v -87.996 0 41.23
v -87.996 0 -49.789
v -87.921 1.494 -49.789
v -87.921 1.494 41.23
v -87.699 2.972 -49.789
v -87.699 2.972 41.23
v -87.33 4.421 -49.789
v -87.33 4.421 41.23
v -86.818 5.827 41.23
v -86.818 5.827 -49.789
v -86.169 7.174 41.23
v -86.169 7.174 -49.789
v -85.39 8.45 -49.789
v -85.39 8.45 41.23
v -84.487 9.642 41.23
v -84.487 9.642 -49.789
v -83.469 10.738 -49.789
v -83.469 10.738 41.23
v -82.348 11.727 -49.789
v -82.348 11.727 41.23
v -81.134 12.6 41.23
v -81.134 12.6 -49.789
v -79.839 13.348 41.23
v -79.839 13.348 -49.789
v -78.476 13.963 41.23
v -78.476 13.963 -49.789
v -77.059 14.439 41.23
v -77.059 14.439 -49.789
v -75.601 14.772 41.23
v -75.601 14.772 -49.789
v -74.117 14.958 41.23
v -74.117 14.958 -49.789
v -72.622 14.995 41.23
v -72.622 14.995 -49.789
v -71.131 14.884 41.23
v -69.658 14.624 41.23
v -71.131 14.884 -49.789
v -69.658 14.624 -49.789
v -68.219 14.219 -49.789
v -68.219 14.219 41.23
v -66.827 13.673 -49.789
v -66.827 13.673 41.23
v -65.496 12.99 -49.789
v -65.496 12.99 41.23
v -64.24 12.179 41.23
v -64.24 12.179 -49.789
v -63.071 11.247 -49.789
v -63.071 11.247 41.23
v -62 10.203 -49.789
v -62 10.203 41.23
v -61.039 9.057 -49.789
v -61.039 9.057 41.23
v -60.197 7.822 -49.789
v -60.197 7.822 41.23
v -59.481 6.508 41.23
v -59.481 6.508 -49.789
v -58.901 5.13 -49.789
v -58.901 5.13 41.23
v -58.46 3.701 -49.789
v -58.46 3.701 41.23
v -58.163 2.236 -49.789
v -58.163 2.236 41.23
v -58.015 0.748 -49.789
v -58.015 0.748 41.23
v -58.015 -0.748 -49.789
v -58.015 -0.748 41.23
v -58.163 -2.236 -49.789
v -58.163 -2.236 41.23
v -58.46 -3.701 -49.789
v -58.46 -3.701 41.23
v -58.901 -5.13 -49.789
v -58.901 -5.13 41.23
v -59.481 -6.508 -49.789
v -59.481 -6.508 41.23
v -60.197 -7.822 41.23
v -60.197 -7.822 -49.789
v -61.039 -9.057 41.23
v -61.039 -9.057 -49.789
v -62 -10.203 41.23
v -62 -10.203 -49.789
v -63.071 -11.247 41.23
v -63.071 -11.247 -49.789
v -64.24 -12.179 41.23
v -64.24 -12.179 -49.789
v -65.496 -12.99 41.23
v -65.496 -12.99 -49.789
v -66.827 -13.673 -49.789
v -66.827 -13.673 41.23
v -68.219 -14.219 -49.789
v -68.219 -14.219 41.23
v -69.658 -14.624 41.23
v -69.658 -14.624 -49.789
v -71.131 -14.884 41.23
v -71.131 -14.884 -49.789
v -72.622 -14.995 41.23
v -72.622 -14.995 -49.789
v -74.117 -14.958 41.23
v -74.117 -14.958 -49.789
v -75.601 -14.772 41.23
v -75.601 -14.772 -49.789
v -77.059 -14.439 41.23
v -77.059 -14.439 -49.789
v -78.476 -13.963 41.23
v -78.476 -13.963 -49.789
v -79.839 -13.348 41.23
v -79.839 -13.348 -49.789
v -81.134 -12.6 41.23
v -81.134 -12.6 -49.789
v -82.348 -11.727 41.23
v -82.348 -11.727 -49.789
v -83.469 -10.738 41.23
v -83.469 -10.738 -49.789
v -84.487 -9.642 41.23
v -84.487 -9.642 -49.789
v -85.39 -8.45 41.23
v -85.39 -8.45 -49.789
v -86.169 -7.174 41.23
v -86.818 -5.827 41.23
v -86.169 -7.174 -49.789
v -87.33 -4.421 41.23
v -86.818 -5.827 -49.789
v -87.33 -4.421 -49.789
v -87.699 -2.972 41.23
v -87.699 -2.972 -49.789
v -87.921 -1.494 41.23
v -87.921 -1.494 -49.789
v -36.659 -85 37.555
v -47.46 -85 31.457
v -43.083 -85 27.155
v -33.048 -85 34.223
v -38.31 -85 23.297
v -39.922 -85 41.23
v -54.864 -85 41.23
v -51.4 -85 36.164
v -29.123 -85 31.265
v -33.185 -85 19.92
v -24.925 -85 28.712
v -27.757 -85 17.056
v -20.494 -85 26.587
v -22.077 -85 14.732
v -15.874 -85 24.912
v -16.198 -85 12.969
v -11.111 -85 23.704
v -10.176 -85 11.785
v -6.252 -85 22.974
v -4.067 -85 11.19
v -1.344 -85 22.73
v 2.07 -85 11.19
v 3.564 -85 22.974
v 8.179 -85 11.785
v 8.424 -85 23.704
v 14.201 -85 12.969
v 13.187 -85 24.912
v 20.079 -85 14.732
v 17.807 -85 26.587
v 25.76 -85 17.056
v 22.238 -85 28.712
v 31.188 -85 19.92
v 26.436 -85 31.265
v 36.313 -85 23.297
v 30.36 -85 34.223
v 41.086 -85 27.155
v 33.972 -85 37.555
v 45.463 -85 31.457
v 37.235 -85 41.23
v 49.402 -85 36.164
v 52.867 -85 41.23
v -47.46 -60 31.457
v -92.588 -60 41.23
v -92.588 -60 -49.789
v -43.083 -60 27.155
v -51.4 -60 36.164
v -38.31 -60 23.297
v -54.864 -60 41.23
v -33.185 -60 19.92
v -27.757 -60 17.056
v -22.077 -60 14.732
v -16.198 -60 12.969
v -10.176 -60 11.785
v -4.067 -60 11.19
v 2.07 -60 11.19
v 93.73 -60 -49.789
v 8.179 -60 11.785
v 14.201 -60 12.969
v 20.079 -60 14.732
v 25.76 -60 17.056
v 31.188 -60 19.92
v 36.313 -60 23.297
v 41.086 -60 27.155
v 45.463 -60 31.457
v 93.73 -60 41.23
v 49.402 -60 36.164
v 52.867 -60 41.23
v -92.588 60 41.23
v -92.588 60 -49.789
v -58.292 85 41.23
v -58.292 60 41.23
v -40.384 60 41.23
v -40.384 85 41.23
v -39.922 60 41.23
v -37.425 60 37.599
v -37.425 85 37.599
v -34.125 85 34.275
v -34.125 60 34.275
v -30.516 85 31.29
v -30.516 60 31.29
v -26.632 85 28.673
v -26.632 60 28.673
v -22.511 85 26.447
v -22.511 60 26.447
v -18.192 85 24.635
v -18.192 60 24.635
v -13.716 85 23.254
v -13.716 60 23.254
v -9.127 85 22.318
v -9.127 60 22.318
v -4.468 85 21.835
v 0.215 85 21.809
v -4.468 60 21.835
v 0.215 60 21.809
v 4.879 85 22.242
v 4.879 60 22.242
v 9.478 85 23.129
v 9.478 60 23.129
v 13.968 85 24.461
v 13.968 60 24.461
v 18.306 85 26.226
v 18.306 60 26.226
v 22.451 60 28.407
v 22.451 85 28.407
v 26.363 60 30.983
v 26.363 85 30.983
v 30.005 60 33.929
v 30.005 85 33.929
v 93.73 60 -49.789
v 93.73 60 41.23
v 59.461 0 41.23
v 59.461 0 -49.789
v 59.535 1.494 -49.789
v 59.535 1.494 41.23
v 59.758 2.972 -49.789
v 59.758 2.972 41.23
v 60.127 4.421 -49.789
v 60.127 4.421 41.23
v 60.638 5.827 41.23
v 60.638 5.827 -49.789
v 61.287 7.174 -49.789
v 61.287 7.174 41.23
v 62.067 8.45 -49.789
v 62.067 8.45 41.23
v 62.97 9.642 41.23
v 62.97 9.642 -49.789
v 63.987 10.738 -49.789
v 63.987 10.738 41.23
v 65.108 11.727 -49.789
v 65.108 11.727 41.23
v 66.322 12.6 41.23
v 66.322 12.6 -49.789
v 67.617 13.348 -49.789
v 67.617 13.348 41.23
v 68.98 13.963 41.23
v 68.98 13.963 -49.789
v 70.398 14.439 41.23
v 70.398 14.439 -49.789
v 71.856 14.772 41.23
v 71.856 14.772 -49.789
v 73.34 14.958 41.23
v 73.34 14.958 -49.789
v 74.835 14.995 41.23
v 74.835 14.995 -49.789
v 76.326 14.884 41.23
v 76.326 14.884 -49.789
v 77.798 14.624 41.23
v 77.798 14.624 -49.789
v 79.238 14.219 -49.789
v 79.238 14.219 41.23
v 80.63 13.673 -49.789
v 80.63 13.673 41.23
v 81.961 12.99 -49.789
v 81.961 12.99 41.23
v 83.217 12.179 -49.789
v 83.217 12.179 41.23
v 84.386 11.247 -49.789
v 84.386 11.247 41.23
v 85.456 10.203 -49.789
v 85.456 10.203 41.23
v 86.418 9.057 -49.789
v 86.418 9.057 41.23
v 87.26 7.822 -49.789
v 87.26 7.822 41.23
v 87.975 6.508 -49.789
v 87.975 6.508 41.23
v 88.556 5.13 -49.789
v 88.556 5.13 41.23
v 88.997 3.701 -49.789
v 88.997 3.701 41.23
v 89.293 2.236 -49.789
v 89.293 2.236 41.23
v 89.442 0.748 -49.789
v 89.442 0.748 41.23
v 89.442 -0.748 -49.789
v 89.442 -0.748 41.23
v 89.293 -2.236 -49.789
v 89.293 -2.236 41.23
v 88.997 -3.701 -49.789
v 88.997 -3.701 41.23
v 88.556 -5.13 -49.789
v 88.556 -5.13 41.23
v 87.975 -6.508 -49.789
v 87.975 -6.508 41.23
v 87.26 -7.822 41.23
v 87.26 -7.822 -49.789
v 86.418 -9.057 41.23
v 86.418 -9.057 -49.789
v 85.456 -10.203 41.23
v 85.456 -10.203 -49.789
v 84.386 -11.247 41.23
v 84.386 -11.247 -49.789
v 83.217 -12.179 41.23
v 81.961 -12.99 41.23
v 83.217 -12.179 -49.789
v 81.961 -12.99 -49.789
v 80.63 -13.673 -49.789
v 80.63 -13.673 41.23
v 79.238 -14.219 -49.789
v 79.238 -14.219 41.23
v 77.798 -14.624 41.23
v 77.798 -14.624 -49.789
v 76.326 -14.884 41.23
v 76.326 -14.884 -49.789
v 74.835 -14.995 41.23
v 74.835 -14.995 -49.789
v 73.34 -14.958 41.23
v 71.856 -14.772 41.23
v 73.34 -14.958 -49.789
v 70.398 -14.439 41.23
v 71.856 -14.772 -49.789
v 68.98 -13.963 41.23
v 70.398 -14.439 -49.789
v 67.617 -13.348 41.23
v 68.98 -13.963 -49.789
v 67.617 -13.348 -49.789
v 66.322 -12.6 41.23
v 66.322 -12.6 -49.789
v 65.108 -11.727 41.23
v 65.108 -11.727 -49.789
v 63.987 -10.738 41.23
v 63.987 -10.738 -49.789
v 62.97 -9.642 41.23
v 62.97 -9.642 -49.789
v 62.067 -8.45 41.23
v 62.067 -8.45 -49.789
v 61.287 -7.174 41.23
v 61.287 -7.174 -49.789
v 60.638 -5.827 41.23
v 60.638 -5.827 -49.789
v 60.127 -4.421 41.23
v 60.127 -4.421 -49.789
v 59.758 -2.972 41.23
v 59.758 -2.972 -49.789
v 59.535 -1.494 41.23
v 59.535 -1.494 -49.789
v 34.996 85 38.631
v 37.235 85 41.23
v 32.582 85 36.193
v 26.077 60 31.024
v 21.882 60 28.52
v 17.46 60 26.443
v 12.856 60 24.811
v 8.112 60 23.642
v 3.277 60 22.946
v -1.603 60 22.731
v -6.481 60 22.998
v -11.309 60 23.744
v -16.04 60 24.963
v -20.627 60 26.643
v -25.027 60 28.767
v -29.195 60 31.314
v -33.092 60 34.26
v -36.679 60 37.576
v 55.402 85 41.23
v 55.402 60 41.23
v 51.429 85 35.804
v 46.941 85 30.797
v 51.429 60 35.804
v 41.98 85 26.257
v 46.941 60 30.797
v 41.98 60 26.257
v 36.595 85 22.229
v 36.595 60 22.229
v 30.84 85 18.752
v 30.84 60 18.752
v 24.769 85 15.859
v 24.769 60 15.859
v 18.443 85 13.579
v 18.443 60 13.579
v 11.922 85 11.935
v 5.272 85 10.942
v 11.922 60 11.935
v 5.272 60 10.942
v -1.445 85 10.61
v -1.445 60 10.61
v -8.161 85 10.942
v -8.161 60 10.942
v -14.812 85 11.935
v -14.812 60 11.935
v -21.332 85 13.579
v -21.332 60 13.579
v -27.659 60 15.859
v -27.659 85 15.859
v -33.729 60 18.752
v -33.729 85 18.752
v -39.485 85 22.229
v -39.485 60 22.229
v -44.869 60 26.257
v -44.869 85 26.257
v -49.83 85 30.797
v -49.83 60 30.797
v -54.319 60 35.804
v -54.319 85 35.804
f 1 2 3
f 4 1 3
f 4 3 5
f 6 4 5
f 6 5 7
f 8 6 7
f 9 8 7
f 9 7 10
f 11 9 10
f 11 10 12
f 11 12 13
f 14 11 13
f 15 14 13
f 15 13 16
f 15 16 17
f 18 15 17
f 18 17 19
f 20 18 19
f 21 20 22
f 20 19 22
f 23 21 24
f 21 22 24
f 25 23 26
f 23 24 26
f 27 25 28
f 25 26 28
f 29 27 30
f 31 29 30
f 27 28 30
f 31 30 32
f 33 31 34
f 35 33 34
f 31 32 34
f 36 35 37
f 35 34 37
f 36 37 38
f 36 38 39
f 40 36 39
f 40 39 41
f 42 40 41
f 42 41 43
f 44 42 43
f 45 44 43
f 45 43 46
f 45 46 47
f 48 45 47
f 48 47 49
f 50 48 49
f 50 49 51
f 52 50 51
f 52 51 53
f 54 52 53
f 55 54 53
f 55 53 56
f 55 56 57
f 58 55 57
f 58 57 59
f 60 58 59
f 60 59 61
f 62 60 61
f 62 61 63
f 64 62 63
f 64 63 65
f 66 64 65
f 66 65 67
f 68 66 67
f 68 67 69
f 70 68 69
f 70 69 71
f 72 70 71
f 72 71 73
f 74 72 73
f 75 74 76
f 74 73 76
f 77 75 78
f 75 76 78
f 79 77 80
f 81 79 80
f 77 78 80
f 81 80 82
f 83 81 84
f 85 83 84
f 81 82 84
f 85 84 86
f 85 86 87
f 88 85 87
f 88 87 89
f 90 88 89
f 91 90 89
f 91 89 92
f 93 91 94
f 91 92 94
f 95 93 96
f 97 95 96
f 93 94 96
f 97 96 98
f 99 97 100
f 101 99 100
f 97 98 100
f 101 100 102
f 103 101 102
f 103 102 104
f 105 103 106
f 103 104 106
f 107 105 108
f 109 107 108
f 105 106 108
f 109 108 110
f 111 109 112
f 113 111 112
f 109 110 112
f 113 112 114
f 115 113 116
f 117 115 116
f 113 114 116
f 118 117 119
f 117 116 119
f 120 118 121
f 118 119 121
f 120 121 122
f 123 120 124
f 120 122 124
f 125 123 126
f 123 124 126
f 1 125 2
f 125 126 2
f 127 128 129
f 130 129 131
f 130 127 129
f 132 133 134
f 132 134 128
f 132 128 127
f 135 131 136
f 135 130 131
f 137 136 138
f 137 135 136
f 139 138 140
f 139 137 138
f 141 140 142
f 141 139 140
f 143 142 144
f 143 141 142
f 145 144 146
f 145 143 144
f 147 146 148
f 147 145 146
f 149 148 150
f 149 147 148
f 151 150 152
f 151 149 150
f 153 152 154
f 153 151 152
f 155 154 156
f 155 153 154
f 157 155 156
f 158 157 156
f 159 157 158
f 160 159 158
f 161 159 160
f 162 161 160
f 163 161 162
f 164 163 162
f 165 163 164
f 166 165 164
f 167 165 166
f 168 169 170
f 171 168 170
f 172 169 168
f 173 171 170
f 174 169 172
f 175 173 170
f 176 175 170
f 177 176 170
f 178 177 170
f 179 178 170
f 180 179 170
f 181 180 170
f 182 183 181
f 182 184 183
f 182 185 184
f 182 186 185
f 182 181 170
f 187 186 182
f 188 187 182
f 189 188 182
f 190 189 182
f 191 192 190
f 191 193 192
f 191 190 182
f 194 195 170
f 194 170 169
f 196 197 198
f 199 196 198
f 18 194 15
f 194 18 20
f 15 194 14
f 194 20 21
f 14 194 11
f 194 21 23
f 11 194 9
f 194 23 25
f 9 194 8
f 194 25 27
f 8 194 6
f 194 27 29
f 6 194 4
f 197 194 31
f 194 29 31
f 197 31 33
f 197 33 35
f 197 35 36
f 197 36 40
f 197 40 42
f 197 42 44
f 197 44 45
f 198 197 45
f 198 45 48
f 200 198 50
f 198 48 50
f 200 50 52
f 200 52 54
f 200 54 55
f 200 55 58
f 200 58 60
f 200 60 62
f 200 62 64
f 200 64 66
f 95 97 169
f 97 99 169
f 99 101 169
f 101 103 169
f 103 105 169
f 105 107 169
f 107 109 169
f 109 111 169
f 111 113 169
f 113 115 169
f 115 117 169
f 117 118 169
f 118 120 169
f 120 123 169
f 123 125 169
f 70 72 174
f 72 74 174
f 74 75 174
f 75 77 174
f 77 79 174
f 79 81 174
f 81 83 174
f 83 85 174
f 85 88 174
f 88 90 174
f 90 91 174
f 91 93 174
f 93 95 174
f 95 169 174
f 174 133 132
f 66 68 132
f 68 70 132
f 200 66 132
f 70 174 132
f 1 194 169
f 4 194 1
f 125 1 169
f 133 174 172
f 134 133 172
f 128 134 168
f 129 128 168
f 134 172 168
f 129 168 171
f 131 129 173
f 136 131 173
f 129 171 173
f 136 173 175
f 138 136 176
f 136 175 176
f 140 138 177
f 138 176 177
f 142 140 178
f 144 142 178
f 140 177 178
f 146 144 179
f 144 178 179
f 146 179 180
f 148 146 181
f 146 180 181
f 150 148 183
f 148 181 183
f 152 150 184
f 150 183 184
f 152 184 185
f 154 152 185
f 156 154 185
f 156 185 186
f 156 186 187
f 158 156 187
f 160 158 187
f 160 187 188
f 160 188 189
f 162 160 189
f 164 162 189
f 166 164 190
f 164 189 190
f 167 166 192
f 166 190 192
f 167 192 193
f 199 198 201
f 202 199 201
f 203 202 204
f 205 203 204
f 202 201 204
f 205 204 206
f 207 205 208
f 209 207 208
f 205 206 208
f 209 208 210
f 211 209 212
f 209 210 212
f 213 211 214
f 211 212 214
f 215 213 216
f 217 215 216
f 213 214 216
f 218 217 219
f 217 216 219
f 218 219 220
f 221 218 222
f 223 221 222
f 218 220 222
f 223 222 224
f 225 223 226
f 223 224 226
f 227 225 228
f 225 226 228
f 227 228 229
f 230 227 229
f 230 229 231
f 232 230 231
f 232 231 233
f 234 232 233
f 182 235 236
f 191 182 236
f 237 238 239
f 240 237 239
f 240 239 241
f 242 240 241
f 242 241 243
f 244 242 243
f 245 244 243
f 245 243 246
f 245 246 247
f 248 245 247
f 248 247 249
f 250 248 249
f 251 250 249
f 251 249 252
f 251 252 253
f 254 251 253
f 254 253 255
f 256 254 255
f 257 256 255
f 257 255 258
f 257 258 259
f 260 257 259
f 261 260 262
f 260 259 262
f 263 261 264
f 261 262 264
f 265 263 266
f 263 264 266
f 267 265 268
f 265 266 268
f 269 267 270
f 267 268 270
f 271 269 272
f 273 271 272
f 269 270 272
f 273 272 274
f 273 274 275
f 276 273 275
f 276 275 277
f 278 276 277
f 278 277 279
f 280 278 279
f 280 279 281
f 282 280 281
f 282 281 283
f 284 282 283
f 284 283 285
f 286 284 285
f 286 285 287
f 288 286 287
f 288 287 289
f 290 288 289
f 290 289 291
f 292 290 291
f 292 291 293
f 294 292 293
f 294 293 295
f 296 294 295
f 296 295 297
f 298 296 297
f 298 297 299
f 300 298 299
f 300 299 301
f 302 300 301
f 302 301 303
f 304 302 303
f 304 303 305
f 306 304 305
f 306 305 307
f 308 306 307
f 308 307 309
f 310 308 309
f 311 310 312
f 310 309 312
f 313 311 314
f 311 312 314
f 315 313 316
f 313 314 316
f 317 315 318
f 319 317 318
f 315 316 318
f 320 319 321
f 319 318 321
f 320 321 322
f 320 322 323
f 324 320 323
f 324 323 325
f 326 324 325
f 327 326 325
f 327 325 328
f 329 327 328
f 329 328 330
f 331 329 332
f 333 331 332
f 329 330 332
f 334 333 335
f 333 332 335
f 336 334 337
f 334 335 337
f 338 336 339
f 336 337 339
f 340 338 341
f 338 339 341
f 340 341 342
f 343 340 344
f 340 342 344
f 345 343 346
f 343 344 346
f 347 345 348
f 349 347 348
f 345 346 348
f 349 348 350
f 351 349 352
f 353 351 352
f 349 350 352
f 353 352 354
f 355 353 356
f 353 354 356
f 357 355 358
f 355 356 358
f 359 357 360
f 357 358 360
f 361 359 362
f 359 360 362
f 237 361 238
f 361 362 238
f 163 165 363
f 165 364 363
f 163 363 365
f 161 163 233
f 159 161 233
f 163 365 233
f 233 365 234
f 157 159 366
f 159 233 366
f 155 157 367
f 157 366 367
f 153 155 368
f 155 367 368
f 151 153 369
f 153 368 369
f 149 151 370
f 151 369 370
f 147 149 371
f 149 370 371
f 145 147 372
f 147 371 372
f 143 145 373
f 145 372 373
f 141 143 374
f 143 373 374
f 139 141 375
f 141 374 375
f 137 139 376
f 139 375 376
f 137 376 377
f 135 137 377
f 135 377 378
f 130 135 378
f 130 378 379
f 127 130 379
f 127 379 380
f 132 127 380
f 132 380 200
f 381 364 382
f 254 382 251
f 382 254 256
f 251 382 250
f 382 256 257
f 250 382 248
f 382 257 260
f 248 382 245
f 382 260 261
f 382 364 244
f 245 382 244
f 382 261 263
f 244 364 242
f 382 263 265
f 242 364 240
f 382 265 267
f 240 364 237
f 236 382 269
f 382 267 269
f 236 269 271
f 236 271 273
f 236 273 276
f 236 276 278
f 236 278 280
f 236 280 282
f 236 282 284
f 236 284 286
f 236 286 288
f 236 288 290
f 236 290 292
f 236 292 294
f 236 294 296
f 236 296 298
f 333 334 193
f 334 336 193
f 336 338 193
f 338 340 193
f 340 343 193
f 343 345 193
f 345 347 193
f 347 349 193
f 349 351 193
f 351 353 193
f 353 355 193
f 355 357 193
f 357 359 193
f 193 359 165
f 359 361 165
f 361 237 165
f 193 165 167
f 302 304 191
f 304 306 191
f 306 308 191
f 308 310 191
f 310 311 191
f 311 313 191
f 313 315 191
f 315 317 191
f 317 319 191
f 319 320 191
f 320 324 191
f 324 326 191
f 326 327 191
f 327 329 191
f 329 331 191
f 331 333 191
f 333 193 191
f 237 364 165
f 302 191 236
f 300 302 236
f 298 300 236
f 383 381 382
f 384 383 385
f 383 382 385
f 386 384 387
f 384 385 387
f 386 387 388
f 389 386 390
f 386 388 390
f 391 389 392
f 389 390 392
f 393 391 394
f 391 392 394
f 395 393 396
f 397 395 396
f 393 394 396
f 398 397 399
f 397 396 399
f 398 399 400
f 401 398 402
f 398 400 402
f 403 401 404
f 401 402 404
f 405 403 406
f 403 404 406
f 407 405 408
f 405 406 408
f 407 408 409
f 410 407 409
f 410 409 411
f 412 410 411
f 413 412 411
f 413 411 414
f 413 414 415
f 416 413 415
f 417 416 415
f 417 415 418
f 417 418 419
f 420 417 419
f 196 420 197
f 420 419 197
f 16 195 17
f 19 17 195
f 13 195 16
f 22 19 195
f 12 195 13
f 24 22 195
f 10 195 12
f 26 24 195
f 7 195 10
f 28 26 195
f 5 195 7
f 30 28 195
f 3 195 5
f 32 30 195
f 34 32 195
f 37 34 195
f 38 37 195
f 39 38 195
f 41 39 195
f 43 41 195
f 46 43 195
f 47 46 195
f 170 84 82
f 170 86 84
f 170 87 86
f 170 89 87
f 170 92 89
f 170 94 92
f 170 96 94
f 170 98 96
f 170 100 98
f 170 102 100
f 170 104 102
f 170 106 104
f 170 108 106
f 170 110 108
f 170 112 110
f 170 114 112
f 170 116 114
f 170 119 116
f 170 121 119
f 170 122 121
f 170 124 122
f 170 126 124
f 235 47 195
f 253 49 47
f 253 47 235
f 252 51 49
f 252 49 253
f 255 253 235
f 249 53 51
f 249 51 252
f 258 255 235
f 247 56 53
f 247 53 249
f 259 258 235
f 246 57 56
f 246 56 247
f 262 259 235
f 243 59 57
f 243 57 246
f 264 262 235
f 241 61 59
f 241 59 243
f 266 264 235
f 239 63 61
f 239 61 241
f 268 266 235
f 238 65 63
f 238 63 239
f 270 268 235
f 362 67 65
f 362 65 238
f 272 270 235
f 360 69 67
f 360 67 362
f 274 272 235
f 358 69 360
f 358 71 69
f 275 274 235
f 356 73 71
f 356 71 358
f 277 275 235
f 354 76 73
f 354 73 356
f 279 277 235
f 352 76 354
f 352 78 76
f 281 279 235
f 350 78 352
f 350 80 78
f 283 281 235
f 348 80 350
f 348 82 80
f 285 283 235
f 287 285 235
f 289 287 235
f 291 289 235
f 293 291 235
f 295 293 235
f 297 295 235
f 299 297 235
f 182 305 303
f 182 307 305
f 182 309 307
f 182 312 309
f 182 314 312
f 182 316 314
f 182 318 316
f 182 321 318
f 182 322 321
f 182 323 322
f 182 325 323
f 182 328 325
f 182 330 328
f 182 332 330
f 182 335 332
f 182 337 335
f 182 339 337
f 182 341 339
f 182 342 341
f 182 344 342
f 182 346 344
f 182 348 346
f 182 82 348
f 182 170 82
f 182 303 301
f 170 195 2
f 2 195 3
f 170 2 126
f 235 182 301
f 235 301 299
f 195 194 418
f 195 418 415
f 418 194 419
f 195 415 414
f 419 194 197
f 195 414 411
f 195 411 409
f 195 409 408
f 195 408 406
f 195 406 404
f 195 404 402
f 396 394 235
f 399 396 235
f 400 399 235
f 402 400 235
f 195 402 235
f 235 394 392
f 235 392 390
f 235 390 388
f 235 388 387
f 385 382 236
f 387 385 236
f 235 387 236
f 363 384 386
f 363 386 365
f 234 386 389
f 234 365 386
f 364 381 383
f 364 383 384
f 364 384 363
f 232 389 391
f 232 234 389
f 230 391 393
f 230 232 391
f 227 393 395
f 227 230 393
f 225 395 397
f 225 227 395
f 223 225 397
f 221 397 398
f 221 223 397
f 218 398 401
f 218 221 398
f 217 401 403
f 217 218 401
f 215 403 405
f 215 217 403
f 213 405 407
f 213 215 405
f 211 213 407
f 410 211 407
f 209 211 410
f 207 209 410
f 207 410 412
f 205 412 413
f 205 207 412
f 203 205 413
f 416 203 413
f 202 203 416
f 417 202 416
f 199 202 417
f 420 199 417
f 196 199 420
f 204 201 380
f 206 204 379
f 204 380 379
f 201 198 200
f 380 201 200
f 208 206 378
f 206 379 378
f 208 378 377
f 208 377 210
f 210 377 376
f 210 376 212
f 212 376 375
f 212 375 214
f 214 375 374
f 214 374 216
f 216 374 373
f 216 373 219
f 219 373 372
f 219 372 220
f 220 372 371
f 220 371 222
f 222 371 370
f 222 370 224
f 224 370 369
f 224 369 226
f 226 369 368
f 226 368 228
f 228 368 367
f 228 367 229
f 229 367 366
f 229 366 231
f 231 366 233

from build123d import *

# Parameters (mm, degrees)
F0_W        = 186.3179504871
F0_H        = 91.0190269351
F1_DEPTH    = 60
F3_DEPTH    = 25
F5_DEPTH    = 25
F7_DEPTH    = 181
F10_D       = 30
F10_ON_F9_D = 30


with BuildPart() as f1:
    # F0 (on Front) → F1 (new body, symmetric)
    with BuildSketch(Plane.XZ):
        with Locations((0.5706548691, -4.2798891664)):
            Rectangle(F0_W, F0_H)
    extrude(amount=F1_DEPTH, both=True)

    # F2 (on face) → F3 (join)
    with BuildSketch(Plane.XZ.offset(60)):
        with BuildLine():
            ThreePointArc((37.2350551188, 41.2296243012), (-1.3436250294, 22.7301151194), (-39.9223051776, 41.2296243012))
            Line((-39.9223051776, 41.2296243012), (-54.8638885904, 41.2296243012))
            ThreePointArc((-54.8638885904, 41.2296243012), (-0.9986385703, 11.1155049194), (52.8666114498, 41.2296243012))
            Line((52.8666114498, 41.2296243012), (37.2350551188, 41.2296243012))
        make_face()
    extrude(amount=F3_DEPTH)

    # F4 (on face) → F5 (join)
    with BuildSketch(Plane(origin=(0, 60, 0), x_dir=(-1, 0, 0), z_dir=(0, 1, 0))):
        with BuildLine():
            Line((-36.6474762559, 41.2296243012), (-55.402355561, 41.2296243012))
            ThreePointArc((-55.402355561, 41.2296243012), (1.44476071, 10.6097235864), (58.291876981, 41.2296243012))
            Line((58.291876981, 41.2296243012), (40.3841994703, 41.2296243012))
            ThreePointArc((40.3841994703, 41.2296243012), (1.8683616072, 21.7640944123), (-36.6474762559, 41.2296243012))
        make_face()
    extrude(amount=F5_DEPTH)

    # F7 (cut): a face of the model
    f7_faces = [f1.faces().sort_by_distance(p)[0] for p in [
        (-1.3436250294, -60, 33.6967312772),
    ]]
    extrude(f7_faces, amount=-F7_DEPTH, mode=Mode.SUBTRACT)

    # F10 (through all)
    with Locations(Plane.XY.offset(41.2296243012)):
        with Locations((-72.9959234595, 0)):
            Hole(F10_D / 2)

    # F10 on F9 (through all)
    with Locations(Plane.XY.offset(41.2296243012)):
        with Locations((74.4606032968, 0)):
            Hole(F10_ON_F9_D / 2)


solid = f1.part
